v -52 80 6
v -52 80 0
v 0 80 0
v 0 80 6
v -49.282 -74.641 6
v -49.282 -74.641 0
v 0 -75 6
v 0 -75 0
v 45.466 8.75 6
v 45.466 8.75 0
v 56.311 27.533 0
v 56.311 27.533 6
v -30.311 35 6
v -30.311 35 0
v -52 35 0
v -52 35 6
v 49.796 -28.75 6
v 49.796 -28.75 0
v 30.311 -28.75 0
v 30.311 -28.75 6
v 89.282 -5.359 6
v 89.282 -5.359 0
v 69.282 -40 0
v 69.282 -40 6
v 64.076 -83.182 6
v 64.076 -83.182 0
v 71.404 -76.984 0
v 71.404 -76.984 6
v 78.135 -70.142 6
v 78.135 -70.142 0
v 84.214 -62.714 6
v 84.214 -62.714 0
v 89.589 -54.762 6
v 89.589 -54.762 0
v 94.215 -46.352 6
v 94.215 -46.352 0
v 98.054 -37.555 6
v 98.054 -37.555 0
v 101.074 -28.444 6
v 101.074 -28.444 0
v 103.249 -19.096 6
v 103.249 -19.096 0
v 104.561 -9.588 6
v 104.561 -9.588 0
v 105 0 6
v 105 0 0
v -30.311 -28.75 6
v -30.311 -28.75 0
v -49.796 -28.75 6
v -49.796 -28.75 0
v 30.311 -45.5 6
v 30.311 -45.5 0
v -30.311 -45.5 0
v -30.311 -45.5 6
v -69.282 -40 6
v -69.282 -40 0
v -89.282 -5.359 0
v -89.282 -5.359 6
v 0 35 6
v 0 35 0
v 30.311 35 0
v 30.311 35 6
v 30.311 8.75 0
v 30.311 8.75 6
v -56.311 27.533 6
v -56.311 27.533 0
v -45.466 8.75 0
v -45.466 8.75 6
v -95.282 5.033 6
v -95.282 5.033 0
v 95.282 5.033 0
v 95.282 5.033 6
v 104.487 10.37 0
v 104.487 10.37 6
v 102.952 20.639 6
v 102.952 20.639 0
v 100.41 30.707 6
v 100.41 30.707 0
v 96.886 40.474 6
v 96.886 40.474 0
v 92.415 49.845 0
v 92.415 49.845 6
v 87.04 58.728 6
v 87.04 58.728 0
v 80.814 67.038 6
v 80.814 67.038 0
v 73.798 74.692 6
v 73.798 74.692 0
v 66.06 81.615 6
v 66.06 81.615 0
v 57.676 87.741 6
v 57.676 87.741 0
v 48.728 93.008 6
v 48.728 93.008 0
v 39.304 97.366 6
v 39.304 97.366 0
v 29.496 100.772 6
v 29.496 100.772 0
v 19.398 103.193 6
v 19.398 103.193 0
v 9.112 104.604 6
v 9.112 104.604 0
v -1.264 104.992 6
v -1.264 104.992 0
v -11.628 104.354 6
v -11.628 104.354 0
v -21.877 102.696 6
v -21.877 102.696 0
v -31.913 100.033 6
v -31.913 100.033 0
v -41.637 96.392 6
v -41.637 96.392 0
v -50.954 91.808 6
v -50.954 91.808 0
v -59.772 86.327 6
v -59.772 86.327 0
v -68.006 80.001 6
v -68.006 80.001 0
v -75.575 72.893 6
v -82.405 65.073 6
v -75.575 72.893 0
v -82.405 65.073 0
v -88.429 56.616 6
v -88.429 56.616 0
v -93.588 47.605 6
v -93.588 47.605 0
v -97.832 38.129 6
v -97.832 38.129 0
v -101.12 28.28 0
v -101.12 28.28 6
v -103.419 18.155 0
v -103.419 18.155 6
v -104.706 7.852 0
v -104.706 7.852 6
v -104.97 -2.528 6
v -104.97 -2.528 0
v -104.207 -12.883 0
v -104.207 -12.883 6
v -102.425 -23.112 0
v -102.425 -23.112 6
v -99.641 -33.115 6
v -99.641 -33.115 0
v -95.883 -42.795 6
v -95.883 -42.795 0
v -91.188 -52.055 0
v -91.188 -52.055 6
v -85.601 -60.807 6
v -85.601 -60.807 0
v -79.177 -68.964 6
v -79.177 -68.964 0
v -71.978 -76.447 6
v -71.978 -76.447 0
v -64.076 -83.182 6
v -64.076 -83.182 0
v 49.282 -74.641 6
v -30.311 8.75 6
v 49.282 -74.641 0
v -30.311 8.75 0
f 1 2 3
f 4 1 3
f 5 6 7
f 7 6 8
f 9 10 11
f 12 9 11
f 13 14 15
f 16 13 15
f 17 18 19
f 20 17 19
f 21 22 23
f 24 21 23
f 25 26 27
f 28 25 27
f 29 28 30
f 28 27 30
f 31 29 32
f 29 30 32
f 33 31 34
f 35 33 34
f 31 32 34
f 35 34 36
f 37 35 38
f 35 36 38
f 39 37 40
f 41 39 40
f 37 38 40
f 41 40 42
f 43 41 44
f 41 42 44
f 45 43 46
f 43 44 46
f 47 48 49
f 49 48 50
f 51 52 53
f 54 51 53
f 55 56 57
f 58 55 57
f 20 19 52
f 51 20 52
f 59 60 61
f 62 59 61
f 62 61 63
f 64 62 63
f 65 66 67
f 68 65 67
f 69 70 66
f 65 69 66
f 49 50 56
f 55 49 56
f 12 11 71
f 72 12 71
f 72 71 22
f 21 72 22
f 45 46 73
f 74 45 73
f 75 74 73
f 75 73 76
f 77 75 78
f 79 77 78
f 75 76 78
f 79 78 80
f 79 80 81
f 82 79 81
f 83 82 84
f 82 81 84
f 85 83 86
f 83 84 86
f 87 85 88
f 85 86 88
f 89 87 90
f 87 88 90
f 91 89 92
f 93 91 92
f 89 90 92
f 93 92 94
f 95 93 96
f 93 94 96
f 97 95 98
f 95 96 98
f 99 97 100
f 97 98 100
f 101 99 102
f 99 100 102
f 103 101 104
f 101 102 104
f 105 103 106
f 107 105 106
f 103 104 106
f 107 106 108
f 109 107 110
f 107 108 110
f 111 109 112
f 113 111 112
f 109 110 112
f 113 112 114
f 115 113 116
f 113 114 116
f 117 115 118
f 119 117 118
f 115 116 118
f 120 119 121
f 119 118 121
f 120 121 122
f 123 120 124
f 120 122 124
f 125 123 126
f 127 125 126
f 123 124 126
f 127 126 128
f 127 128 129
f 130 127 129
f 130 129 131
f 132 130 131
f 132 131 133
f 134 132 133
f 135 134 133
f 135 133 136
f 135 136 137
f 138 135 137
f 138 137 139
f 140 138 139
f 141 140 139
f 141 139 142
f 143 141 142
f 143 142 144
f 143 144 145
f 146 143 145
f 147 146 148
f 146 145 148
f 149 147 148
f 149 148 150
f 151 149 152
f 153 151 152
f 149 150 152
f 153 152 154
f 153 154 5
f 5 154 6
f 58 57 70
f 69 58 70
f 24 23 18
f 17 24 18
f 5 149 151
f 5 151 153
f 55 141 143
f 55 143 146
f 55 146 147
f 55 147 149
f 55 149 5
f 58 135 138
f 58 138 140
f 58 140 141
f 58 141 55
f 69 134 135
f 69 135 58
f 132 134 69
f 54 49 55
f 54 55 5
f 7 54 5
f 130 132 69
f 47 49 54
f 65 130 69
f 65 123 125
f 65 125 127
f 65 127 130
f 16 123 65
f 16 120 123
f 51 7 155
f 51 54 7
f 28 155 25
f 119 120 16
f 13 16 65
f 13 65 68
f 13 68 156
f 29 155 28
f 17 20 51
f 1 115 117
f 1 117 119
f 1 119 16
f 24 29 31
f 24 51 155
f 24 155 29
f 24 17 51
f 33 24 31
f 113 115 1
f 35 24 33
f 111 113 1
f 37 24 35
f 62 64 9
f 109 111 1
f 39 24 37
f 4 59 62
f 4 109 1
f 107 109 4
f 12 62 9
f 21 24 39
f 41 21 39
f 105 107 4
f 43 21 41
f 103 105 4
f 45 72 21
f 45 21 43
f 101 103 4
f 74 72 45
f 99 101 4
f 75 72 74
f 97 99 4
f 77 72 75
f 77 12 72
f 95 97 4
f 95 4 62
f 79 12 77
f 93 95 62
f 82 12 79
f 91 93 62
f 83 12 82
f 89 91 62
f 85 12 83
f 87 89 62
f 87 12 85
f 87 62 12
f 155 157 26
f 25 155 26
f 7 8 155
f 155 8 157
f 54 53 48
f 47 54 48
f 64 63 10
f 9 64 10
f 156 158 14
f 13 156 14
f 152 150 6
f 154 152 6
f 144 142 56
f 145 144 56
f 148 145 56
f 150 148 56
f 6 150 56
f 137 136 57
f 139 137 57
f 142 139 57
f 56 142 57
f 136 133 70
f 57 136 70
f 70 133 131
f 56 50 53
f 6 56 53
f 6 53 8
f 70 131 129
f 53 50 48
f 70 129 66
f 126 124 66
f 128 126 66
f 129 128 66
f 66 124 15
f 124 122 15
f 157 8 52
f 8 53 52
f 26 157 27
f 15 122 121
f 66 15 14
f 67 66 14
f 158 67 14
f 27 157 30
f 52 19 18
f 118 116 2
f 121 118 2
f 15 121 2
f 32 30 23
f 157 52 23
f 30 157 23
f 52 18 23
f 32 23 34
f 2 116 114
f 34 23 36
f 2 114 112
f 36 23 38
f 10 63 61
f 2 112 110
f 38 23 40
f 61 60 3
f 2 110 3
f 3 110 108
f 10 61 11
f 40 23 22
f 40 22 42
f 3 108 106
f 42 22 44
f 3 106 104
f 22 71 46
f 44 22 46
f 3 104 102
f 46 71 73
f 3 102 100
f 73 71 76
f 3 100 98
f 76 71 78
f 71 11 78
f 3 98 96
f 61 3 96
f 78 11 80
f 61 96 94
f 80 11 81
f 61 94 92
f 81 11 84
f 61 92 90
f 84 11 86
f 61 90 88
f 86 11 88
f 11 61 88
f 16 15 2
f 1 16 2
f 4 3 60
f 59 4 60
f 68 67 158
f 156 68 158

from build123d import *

# Parameters (mm, degrees)
F1_DEPTH = 6


with BuildPart() as f1:
    # F0 (on Top) → F1 (new body)
    with BuildSketch(Plane.XY):
        with BuildLine():
            ThreePointArc((64.075859, -83.182236), (94.215087, -46.352103), (105, 0))
            ThreePointArc((105, 0), (-46.352103, 94.215087), (-64.075859, -83.182236))
            Line((-64.075859, -83.182236), (-49.282032, -74.641016))
            Line((-49.282032, -74.641016), (0, -75))
            Line((0, -75), (49.282032, -74.641016))
            Line((49.282032, -74.641016), (64.075859, -83.182236))
        make_face()
        Polygon((-49.796461, -28.75), (-69.282032, -40), (-89.282032, -5.358984), (-95.282032, 5.033321), (-56.310889, 27.533321), (-45.466334, 8.75), (-30.310889, 8.75), (-30.310889, 35), (-52, 35), (-52, 80), (0, 80), (0, 35), (30.310889, 35), (30.310889, 8.75), (45.466334, 8.75), (56.310889, 27.533321), (95.282032, 5.033321), (89.282032, -5.358984), (69.282032, -40), (49.796461, -28.75), (30.310889, -28.75), (30.310889, -45.5), (-30.310889, -45.5), (-30.310889, -28.75), align=None, mode=Mode.SUBTRACT)
    extrude(amount=F1_DEPTH)


solid = f1.part
